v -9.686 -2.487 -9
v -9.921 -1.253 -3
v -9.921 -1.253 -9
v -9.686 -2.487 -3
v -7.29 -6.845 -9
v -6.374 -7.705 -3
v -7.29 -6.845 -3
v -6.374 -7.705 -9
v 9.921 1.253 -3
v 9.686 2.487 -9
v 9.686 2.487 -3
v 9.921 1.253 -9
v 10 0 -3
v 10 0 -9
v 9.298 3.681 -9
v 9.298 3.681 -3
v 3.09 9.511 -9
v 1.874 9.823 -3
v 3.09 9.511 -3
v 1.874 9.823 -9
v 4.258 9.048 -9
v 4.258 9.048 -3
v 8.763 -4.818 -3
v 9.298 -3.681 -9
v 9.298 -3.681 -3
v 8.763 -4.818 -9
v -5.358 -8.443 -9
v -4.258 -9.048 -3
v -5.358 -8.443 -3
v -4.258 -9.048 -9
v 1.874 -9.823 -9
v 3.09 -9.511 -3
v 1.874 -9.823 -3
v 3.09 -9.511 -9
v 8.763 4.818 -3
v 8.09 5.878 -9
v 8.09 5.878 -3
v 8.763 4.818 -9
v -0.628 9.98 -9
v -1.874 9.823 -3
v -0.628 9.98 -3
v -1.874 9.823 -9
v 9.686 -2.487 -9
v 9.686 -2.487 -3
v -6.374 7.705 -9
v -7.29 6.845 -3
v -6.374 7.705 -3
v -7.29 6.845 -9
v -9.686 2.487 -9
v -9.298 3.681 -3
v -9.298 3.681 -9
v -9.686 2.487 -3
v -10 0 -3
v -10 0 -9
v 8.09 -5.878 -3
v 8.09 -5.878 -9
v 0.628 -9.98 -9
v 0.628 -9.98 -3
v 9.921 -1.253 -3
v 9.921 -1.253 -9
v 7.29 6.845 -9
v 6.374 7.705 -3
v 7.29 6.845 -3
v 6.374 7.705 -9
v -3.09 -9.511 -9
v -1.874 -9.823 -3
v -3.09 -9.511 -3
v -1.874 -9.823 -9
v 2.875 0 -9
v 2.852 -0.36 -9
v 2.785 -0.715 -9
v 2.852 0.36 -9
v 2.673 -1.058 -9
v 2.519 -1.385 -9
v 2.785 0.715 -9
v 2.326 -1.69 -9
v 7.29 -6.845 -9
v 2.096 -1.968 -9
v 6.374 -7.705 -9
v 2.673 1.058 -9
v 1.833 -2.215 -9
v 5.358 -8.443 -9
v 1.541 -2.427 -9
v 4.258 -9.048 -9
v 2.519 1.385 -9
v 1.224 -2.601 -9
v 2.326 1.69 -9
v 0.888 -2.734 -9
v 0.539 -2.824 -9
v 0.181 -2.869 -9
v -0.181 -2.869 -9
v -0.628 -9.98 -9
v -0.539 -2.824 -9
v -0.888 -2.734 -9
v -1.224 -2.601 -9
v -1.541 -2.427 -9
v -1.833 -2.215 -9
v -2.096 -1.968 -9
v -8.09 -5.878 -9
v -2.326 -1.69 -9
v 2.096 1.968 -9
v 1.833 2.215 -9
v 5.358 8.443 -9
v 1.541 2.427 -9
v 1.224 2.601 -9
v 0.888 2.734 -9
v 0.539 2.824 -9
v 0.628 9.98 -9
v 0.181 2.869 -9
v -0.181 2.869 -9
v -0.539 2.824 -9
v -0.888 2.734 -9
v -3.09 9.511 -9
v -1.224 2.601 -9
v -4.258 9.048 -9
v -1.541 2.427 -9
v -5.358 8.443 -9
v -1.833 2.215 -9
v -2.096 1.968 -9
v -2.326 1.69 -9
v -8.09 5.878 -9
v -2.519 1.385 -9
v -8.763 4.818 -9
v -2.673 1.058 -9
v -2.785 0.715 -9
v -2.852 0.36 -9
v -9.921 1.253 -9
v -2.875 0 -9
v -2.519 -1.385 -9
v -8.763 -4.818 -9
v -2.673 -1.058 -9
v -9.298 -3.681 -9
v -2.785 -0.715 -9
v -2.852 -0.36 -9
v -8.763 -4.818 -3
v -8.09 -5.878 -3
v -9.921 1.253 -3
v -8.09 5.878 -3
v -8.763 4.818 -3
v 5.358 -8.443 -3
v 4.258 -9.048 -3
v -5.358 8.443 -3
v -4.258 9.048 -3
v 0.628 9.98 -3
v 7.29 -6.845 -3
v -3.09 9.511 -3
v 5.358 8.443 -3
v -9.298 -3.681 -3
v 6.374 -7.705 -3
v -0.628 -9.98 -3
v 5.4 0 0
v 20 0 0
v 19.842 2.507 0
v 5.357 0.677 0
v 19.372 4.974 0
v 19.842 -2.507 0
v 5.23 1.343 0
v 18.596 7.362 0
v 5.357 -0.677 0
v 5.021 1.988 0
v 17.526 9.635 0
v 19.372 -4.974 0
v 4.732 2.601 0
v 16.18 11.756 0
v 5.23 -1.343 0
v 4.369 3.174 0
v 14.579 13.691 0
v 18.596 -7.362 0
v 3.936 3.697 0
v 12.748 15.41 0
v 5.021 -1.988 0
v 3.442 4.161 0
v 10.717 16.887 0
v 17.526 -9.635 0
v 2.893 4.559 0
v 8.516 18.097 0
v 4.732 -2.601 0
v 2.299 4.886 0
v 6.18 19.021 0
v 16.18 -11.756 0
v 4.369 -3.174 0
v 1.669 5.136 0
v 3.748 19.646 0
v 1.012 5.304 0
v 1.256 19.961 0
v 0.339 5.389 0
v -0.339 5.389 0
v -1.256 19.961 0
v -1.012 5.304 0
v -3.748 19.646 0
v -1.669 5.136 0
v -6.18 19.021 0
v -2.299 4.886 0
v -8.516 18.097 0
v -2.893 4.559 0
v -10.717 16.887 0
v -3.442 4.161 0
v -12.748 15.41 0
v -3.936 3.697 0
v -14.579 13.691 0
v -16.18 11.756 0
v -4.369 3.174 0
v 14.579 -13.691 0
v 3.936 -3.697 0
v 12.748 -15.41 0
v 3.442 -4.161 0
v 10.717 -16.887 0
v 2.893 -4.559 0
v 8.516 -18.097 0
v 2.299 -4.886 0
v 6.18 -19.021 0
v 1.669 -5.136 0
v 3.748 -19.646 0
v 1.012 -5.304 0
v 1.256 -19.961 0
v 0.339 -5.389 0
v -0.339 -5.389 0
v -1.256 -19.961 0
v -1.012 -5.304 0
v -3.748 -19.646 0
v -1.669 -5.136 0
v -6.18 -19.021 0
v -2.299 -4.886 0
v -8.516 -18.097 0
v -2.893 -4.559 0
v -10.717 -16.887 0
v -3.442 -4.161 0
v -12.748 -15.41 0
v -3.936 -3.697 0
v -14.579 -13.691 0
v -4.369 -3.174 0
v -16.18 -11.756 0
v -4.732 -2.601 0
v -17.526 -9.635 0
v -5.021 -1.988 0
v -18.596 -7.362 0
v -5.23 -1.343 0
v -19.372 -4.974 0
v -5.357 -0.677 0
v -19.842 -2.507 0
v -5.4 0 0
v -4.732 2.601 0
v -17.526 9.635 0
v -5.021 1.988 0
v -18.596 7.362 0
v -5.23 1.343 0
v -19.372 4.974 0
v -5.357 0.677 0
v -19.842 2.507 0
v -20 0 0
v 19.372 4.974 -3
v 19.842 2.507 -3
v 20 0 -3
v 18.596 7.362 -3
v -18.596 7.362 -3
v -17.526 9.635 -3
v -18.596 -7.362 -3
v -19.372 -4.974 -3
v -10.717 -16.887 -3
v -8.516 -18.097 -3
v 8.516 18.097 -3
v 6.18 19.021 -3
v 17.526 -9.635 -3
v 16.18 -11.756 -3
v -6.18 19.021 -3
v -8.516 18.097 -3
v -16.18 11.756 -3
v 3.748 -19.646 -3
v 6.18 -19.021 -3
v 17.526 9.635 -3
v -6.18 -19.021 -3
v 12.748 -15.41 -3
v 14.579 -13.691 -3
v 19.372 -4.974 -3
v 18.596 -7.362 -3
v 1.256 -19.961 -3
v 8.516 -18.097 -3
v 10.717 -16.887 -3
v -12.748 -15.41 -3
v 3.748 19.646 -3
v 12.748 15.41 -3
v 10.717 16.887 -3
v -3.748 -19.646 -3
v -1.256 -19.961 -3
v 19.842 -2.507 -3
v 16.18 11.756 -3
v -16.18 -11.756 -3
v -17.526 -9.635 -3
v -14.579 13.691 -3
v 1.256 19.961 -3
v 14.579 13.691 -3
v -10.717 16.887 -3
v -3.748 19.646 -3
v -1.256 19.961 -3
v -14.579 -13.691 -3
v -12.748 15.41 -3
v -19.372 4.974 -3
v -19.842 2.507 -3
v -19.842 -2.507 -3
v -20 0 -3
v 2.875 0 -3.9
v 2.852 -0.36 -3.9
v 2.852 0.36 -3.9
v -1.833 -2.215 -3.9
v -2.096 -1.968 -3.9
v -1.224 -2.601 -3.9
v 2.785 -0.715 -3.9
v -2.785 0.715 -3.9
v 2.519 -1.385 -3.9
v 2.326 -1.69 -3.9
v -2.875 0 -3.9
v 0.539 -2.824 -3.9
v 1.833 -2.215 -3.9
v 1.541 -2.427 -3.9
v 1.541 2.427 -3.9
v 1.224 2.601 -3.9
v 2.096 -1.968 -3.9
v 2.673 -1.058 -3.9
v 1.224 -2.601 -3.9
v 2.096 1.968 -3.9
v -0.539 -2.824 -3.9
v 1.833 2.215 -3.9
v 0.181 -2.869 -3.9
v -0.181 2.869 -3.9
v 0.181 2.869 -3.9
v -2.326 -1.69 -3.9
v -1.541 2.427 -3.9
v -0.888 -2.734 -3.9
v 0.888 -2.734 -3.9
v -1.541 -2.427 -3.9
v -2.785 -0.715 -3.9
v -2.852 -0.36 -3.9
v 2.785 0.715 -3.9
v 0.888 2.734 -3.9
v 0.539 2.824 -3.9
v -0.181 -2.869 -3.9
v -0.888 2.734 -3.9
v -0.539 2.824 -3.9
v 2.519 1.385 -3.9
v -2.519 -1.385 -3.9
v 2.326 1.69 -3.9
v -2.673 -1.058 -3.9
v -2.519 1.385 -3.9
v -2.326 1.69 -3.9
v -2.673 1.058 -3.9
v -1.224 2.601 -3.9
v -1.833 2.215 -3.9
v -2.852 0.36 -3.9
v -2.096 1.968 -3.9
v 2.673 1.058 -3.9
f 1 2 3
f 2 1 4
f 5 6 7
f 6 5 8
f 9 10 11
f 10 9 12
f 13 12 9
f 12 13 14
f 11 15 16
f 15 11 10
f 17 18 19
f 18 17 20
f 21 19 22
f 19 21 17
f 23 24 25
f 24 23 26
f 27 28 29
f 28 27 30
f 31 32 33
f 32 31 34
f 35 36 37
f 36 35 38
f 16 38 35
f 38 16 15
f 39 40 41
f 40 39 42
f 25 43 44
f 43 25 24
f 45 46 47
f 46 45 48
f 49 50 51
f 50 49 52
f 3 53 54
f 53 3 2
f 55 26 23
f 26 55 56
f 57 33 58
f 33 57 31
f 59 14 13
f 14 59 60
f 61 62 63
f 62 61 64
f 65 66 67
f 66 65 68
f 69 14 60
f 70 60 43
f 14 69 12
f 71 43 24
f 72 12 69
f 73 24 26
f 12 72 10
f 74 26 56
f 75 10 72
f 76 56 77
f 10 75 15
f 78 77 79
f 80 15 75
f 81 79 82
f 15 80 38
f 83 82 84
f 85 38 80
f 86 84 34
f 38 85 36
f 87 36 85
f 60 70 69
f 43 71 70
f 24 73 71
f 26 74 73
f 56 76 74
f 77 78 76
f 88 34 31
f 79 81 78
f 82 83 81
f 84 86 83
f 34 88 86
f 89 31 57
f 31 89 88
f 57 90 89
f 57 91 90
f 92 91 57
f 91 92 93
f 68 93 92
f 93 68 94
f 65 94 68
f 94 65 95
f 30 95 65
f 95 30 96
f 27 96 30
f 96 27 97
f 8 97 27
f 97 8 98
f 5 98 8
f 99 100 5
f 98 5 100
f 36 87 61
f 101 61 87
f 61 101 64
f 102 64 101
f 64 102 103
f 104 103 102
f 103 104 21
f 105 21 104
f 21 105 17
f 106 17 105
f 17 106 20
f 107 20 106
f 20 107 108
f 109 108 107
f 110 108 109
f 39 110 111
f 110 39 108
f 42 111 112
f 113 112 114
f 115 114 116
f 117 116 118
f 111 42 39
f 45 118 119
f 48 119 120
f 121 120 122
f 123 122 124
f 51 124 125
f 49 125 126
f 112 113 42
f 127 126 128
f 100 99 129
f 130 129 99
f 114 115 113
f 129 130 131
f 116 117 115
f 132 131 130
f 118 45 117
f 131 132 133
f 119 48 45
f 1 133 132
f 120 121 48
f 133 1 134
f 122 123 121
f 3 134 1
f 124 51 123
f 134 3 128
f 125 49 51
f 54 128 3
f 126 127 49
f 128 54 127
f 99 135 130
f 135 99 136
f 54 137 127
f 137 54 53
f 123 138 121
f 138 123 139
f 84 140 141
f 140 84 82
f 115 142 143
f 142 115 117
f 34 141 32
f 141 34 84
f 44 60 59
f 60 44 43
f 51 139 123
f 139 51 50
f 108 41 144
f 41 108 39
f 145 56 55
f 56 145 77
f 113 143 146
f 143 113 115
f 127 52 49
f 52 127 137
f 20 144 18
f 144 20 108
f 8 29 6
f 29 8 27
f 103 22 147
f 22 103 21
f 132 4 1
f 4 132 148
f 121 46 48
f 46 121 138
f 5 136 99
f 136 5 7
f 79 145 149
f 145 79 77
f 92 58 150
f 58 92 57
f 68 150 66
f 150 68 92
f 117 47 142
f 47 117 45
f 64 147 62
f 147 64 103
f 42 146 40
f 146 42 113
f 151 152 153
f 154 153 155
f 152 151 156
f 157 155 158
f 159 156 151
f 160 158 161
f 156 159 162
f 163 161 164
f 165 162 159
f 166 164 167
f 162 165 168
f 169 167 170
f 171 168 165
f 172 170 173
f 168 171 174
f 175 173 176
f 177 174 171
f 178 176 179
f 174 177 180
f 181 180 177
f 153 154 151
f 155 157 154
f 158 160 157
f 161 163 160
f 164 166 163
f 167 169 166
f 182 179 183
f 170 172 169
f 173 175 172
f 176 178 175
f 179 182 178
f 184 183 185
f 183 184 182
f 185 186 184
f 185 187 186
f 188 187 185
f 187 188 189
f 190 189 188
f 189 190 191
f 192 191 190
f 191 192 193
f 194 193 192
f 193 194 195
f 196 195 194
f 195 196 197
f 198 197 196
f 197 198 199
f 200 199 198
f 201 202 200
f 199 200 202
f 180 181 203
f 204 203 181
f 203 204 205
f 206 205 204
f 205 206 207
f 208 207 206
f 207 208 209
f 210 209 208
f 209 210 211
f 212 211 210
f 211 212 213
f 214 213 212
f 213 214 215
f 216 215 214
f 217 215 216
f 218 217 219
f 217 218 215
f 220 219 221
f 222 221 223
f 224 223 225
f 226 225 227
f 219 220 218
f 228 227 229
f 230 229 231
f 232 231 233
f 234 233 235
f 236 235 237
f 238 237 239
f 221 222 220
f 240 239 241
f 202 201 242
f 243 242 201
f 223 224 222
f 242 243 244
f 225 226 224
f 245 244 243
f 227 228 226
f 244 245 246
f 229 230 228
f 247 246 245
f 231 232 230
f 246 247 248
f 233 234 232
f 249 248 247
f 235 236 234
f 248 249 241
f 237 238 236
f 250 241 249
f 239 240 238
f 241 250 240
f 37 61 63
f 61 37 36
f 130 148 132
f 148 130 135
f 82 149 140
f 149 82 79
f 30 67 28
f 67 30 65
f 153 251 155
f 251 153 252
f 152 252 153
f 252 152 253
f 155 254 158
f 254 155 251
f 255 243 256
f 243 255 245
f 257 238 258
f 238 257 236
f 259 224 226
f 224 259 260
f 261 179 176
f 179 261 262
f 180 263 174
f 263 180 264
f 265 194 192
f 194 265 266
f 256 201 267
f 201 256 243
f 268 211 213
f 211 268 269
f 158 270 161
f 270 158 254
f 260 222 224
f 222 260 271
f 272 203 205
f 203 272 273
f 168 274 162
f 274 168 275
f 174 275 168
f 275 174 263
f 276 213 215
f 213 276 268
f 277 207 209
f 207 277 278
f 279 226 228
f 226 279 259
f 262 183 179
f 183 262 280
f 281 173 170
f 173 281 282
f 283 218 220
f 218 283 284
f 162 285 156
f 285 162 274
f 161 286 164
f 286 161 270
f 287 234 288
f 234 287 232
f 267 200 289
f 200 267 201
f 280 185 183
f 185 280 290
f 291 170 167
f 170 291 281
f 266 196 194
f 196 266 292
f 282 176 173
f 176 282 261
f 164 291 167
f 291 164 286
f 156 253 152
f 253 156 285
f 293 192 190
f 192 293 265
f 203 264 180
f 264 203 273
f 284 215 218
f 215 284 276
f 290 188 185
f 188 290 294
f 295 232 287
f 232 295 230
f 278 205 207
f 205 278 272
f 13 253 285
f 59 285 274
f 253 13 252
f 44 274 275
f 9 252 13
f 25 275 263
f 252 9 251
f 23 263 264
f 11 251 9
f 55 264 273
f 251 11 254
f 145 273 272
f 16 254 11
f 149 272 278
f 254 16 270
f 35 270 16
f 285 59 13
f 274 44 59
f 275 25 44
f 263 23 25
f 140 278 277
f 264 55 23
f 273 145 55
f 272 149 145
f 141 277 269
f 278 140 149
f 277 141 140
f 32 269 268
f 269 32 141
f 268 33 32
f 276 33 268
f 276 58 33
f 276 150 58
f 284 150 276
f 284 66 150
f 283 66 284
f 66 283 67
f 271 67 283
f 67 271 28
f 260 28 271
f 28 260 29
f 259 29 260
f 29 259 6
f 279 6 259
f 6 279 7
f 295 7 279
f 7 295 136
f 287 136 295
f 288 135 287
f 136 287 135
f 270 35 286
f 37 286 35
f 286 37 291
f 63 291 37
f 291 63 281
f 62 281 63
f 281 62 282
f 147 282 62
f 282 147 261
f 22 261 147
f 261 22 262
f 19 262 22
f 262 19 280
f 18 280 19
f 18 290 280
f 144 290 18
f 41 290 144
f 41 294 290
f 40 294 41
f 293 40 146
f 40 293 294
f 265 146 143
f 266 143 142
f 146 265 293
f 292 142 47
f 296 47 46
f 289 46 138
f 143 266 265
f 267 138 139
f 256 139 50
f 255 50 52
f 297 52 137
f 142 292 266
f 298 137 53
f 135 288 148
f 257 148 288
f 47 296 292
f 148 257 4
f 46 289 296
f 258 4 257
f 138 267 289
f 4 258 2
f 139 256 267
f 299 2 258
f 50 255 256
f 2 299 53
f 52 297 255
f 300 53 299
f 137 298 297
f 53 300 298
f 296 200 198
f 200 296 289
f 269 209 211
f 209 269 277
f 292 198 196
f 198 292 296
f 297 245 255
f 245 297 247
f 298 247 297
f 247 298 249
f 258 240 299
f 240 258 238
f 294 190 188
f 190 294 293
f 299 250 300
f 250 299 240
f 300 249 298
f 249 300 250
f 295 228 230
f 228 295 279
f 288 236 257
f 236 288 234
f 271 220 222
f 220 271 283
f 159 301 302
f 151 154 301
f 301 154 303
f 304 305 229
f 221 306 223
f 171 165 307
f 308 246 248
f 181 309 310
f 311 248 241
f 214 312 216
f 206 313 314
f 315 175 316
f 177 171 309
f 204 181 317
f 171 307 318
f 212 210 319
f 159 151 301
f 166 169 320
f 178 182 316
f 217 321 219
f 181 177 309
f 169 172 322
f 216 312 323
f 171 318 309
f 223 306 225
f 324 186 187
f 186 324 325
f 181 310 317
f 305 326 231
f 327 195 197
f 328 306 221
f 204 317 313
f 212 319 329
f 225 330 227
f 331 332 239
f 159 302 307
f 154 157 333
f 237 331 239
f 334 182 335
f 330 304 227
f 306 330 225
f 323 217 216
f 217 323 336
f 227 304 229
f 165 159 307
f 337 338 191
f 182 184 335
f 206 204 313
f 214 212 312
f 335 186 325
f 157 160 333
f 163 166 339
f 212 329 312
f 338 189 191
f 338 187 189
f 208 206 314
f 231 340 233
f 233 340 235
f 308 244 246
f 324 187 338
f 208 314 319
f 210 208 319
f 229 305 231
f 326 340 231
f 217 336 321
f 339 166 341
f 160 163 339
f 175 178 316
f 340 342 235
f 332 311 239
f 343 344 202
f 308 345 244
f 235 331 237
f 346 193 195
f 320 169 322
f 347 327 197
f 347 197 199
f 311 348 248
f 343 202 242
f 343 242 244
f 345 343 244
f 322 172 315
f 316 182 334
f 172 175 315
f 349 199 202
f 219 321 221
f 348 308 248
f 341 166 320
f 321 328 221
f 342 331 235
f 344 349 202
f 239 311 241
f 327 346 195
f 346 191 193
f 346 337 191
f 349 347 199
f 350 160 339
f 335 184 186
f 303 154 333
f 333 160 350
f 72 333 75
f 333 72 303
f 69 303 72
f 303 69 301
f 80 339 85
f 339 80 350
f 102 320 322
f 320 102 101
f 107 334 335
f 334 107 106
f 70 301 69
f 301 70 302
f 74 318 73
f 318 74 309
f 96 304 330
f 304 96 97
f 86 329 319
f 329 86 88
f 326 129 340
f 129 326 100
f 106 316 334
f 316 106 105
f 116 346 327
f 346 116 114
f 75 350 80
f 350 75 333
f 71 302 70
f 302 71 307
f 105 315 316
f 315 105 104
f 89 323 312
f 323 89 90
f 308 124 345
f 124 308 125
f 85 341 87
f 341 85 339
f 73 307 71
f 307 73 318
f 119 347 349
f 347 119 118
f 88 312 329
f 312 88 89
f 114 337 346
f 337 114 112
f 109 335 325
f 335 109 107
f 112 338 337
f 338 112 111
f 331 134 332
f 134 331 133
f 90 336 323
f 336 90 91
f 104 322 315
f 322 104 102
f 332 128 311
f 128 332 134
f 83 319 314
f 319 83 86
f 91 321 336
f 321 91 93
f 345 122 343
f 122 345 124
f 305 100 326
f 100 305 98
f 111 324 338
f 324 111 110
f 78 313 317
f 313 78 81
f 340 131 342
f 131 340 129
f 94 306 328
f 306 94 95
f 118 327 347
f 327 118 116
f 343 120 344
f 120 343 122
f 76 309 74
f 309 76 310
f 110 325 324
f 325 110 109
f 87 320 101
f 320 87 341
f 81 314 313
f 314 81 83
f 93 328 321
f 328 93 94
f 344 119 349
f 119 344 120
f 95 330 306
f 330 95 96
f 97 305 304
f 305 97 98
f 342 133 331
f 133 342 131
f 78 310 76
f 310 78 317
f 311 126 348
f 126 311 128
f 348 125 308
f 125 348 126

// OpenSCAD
$fn = 50;


difference() {
	union() {
		translate(v = [0, 0, -9.0000000000]) {
			cylinder(h = 9, r = 10.0000000000);
		}
		translate(v = [0, 0, -3.0000000000]) {
			cylinder(h = 3, r = 20.0000000000);
		}
	}
	union() {
		translate(v = [0, 0, 0]) {
			rotate(a = [0, 0, 0]) {
				difference() {
					union() {
						#translate(v = [0, 0, -9.0000000000]) {
							cylinder(h = 9, r = 2.6000000000);
						}
						#translate(v = [0, 0, -3.9000000000]) {
							cylinder(h = 3.9000000000, r = 10.0000000000, r1 = 2.8750000000, r2 = 5.4000000000);
						}
						#translate(v = [0, 0, -9.0000000000]) {
							cylinder(h = 9, r = 2.8750000000);
						}
						#translate(v = [0, 0, -9.0000000000]) {
							cylinder(h = 9, r = 2.6000000000);
						}
					}
					union();
				}
			}
		}
	}
}
